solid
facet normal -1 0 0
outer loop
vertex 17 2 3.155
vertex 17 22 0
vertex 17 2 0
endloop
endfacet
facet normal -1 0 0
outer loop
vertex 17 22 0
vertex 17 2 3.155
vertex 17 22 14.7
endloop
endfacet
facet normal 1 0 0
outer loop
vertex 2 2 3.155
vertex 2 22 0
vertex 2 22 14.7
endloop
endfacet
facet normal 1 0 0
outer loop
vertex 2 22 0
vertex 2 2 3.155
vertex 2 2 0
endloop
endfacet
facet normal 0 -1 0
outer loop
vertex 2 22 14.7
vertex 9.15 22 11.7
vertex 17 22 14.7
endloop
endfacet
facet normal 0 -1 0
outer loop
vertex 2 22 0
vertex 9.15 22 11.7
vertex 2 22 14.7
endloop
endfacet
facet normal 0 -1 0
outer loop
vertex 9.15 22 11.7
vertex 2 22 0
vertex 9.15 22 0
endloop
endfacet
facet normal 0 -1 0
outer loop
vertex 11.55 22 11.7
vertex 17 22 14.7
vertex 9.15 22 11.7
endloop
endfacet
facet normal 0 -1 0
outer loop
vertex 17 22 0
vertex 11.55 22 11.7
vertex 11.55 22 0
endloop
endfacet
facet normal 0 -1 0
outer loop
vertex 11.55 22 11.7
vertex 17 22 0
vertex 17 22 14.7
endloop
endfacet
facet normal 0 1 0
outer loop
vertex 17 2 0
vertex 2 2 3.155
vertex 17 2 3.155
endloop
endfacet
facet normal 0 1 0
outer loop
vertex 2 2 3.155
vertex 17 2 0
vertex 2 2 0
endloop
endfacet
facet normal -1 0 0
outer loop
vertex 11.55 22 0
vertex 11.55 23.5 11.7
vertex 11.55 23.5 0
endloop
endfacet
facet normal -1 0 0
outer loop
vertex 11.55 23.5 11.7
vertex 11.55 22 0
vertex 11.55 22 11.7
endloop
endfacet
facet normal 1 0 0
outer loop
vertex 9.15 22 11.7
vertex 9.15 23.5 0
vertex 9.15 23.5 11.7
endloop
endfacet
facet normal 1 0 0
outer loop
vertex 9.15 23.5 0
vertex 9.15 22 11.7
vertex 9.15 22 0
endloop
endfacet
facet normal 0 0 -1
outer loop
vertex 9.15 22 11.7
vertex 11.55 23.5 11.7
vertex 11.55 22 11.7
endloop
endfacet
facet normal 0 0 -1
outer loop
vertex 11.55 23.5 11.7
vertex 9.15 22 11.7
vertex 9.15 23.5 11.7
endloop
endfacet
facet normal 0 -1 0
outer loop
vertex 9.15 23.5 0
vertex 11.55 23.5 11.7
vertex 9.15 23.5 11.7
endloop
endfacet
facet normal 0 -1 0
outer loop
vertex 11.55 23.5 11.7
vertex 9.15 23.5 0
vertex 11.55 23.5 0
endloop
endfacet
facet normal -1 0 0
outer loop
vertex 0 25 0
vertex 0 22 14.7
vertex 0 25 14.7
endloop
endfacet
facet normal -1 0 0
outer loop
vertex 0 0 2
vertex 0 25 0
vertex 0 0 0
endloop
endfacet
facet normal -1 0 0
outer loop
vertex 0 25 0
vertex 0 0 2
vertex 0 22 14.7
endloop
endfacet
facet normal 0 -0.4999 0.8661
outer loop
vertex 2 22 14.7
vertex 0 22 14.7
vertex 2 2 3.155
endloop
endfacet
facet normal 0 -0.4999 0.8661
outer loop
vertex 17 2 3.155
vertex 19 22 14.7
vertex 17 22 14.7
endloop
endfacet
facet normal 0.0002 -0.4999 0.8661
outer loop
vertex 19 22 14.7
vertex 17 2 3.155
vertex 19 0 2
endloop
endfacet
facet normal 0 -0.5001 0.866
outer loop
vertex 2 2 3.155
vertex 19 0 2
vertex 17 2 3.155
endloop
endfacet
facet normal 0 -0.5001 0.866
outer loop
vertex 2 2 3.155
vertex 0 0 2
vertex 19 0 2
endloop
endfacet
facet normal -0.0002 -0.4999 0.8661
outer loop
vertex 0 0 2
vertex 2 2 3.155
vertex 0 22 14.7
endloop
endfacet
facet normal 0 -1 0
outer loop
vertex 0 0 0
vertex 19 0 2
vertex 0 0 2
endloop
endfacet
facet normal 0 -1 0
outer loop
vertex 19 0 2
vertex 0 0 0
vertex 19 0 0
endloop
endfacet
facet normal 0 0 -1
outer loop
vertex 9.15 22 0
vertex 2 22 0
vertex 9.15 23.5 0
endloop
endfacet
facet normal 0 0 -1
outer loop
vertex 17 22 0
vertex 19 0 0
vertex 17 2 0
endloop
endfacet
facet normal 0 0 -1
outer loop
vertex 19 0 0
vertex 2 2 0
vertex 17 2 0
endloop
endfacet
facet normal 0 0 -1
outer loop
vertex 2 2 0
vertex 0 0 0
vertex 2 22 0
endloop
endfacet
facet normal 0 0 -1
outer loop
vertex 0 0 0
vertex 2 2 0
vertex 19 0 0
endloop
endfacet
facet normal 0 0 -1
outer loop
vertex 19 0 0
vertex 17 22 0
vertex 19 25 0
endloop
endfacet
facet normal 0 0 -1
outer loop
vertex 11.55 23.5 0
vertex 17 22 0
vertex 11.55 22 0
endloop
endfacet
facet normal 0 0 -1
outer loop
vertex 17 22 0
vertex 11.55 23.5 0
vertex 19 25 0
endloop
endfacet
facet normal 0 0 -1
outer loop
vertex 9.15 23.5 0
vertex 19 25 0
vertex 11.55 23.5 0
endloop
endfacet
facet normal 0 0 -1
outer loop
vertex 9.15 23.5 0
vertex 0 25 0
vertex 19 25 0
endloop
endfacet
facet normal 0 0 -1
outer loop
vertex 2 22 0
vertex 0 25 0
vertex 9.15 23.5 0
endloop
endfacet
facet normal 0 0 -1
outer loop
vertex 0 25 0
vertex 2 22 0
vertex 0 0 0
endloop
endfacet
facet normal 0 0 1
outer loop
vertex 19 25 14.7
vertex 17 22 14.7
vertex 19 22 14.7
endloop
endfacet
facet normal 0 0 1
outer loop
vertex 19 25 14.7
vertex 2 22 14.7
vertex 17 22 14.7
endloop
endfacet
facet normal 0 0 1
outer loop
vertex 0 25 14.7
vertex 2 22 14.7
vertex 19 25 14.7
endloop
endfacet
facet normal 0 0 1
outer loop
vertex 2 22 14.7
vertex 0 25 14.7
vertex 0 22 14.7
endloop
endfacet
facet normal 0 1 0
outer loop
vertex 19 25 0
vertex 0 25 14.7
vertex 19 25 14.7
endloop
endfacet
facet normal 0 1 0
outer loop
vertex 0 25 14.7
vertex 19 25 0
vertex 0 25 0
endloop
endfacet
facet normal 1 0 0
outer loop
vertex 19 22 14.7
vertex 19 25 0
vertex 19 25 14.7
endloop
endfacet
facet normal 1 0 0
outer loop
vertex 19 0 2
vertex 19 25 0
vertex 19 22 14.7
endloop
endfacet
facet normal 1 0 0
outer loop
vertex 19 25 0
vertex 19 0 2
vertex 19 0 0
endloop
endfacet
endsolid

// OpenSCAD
// file: radial-cooling-fan.scad
// Copyright 2017 Pavel Penev
// https://www.thingiverse.com/pavpen/about
//
// You can use this file under Attribution-ShareAlike 4.0 International
// (CC BY-SA 4.0).
//
// If you need to use it under another license, send me a message.

body_outer_r = 50 / 2;
outer_thickness = 15;
wall_thickness = 1.5;
rotor_axle_outer_r = 25 / 2;
rotor_center_offset = [1.5, -2.5];
intake_slit_width = 4;
intake_slit_depth = 10;
outlet_h = 20;
outlet_protrusion = 2;
mount_flap_outer_r = 7.15 / 2;
mount_hole_r = 4.5 / 2;
   
mount_hole_perimeter_points =
    pro_pavpen_radial_cooling_fan_mount_hole_perimeter_points();
mount_hole_centers = [
    mount_hole_perimeter_points[0] - [1 / sqrt(2), -1 / sqrt(2)] * mount_flap_outer_r,
    mount_hole_perimeter_points[1] + [1 / sqrt(2), -1 / sqrt(2)] * mount_flap_outer_r
];

outlet_seam_length = 11.5;
outlet_seam_width = 2;
outlet_seam_h = 1.3;
outlet_seam_offset_from_edge = 0.2;
outlet_seam_offset_from_top = 5.85;


$fn = 50;

function pro_pavpen_radial_cooling_fan_mount_hole_perimeter_points() =
    let (n = [1, -1],
         c = rotor_center_offset,
         r = body_outer_r,
         a = c[0] * n[0] + c[1] * n[1],
         d = n[0] * n[0] + n[1] * n[1],
         b = a - d * (c[0] * c[0] + c[1] * c[1] - r * r),
         t = [(-a - sqrt(b)) / d, (-a + sqrt(b)) / d])
    [
        [c[0] + n[0] * t[0], c[1] + n[1] * t[0]],
        [c[0] + n[0] * t[1], c[1] + n[1] * t[1]]
    ];


// Export functions:

function pro_pavpen_radial_cooling_fan_body_outer_r() = body_outer_r;

function pro_pavpen_radial_cooling_fan_outer_thickness() = outer_thickness;

function pro_pavpen_radial_cooling_fan_outlet_h() = outlet_h;

function pro_pavpen_radial_cooling_fan_outlet_protrusion() =
    outlet_protrusion;

function pro_pavpen_radial_cooling_fan_outlet_seam_length() =
    outlet_seam_length;

function pro_pavpen_radial_cooling_fan_outlet_seam_width() =
    outlet_seam_width;

function pro_pavpen_radial_cooling_fan_outlet_seam_h() = outlet_seam_h;

function pro_pavpen_radial_cooling_fan_outlet_seam_offset_from_edge() =
    outlet_seam_offset_from_edge;



// Demo:
pro_pavpen_radial_cooling_fan();


module pro_pavpen_radial_cooling_fan()
{
    difference()
    {
        pro_pavpen_radial_cooling_fan_outline();
        pro_pavpen_radial_cooling_fan_holes();
    }
}

module pro_pavpen_radial_cooling_fan_outline()
{
    union()
    {
        linear_extrude(outer_thickness)
        union()
        {
            // Body:
            circle(r = body_outer_r);
            
            // Outlet:
            translate([
                outlet_protrusion,
                body_outer_r - outlet_h])
            square([body_outer_r, outlet_h]);
            
            // Mount flaps:
            hull()
            {
                for (xy = mount_hole_centers)
                {
                    translate([xy[0], xy[1], 0])
                    circle(r = mount_flap_outer_r);
                }
            }
        }
        
        // Intake seam:
        pro_pavpen_radial_cooling_fan_position_as_outlet_seam()
        pro_pavpen_radial_cooling_fan_outlet_seam();
    }
}

module pro_pavpen_radial_cooling_fan_holes(
    extend_top_h = 1,
    extend_bottom_h = 1,
    extend_right_h = 1
)
{
    union()
    {
        // Intake slit:
        translate([
            rotor_center_offset[0],
            rotor_center_offset[1],
            -extend_bottom_h])
        difference()
        {
            cylinder(
                r = rotor_axle_outer_r + intake_slit_width,
                h = intake_slit_depth + extend_bottom_h);

            translate([0, 0, -1])
            cylinder(
                r = rotor_axle_outer_r,
                h = intake_slit_depth + extend_bottom_h + 2);
        }
        
        // Mount flap holes:
        for (xy = mount_hole_centers)
        {
            translate([xy[0], xy[1], -extend_bottom_h])
            cylinder(
                r = mount_hole_r,
                h = outer_thickness + extend_bottom_h + extend_top_h);
        }
        
        // Body:
        translate([0, 0, wall_thickness])
        linear_extrude(outer_thickness - 2 * wall_thickness)
        union()
        {
            // Body:
            circle(r = body_outer_r - wall_thickness);
            
            // Outlet:
            translate([
                outlet_protrusion,
                body_outer_r - outlet_h + wall_thickness])
            square([
                body_outer_r + extend_right_h,
                outlet_h - 2 * wall_thickness]);
        }
    }
}

module pro_pavpen_radial_cooling_fan_position_as_outlet_seam()
{
    translate([
        body_outer_r + outlet_protrusion - outlet_seam_length - outlet_seam_offset_from_edge,
        body_outer_r,
        outer_thickness - outlet_seam_width - outlet_seam_offset_from_top])
    children();
}

module pro_pavpen_radial_cooling_fan_outlet_seam()
{
    cube([
        outlet_seam_length,
        outlet_seam_h,
        outlet_seam_width]);
}
// main file
// Copyright 2017 Pavel Penev
// https://www.thingiverse.com/pavpen/about
//
// You can use this file under Attribution-ShareAlike 4.0 International
// (CC BY-SA 4.0).
//
// If you need to use it under another license, send me a message.

use <radial-cooling-fan.scad>

fan_clearance = 0;
fan_outer_thickness =
    pro_pavpen_radial_cooling_fan_outer_thickness() + 2 * fan_clearance;
fan_outlet_h = pro_pavpen_radial_cooling_fan_outlet_h() + 2 * fan_clearance;

wall_thickness = 2;
back_wall_thickness = 3;
wall_above_outlet_seam_h = 3;
outlet_seam_clearance = 0.2;


// Export functions:
function pro_pavpen_radial_cooling_fan_outlet_socket_wall_thickness() =
    wall_thickness;

function pro_pavpen_radial_cooling_fan_outlet_socket_back_wall_thickness() =
    back_wall_thickness;


// Demo:
pro_pavpen_radial_cooling_fan_outlet_socket();

//pro_pavpen_radial_cooling_fan_outlet_socket_position_as_fan()
//%pro_pavpen_radial_cooling_fan();



module pro_pavpen_radial_cooling_fan_outlet_socket()
{
    difference()
    {
        pro_pavpen_radial_cooling_fan_outlet_socket_outline();
    
        pro_pavpen_radial_cooling_fan_outlet_socket_holes();
    }
}

module pro_pavpen_radial_cooling_fan_outlet_socket_outline()
{
    hull()
    {
        translate([
            0,
            fan_outlet_h + wall_thickness,
            0])
        cube([
            fan_outer_thickness + 2 * wall_thickness,
            back_wall_thickness,
            pro_pavpen_radial_cooling_fan_outlet_seam_offset_from_edge() +
                pro_pavpen_radial_cooling_fan_outlet_seam_length() +
                wall_above_outlet_seam_h]);
        
        cube([
            fan_outer_thickness + 2 * wall_thickness,
            wall_thickness,
            pro_pavpen_radial_cooling_fan_outlet_protrusion()]);
    }
}

module pro_pavpen_radial_cooling_fan_outlet_socket_holes(
    extra_top_h = 1,
    extra_bottom_h = 1
)
{
    translate([
        wall_thickness,
        wall_thickness,
        -extra_bottom_h])
    cube([
        fan_outer_thickness,
        fan_outlet_h,
        pro_pavpen_radial_cooling_fan_outlet_seam_offset_from_edge() +
            pro_pavpen_radial_cooling_fan_outlet_seam_length() +
            wall_above_outlet_seam_h + extra_bottom_h + extra_top_h]);
    
    // Outlet seam:
    pro_pavpen_radial_cooling_fan_outlet_socket_position_as_fan()
    pro_pavpen_radial_cooling_fan_position_as_outlet_seam()
    pro_pavpen_radial_cooling_fan_outlet_seam();
}

module pro_pavpen_radial_cooling_fan_outlet_seam()
{
    translate([0, -1, 0])
    cube([
        pro_pavpen_radial_cooling_fan_outlet_seam_length() +
            2 * outlet_seam_clearance,
        pro_pavpen_radial_cooling_fan_outlet_seam_h() +
            outlet_seam_clearance + 1,
        pro_pavpen_radial_cooling_fan_outlet_seam_width() +
            2 * outlet_seam_clearance]);
}

module pro_pavpen_radial_cooling_fan_outlet_socket_position_as_fan()
{
    translate([
        wall_thickness + fan_clearance,
        -pro_pavpen_radial_cooling_fan_body_outer_r() +
            pro_pavpen_radial_cooling_fan_outlet_h() + wall_thickness +
            fan_clearance,
        pro_pavpen_radial_cooling_fan_body_outer_r() +
            pro_pavpen_radial_cooling_fan_outlet_protrusion()])
    rotate([0, 90, 0])
    children();
}
